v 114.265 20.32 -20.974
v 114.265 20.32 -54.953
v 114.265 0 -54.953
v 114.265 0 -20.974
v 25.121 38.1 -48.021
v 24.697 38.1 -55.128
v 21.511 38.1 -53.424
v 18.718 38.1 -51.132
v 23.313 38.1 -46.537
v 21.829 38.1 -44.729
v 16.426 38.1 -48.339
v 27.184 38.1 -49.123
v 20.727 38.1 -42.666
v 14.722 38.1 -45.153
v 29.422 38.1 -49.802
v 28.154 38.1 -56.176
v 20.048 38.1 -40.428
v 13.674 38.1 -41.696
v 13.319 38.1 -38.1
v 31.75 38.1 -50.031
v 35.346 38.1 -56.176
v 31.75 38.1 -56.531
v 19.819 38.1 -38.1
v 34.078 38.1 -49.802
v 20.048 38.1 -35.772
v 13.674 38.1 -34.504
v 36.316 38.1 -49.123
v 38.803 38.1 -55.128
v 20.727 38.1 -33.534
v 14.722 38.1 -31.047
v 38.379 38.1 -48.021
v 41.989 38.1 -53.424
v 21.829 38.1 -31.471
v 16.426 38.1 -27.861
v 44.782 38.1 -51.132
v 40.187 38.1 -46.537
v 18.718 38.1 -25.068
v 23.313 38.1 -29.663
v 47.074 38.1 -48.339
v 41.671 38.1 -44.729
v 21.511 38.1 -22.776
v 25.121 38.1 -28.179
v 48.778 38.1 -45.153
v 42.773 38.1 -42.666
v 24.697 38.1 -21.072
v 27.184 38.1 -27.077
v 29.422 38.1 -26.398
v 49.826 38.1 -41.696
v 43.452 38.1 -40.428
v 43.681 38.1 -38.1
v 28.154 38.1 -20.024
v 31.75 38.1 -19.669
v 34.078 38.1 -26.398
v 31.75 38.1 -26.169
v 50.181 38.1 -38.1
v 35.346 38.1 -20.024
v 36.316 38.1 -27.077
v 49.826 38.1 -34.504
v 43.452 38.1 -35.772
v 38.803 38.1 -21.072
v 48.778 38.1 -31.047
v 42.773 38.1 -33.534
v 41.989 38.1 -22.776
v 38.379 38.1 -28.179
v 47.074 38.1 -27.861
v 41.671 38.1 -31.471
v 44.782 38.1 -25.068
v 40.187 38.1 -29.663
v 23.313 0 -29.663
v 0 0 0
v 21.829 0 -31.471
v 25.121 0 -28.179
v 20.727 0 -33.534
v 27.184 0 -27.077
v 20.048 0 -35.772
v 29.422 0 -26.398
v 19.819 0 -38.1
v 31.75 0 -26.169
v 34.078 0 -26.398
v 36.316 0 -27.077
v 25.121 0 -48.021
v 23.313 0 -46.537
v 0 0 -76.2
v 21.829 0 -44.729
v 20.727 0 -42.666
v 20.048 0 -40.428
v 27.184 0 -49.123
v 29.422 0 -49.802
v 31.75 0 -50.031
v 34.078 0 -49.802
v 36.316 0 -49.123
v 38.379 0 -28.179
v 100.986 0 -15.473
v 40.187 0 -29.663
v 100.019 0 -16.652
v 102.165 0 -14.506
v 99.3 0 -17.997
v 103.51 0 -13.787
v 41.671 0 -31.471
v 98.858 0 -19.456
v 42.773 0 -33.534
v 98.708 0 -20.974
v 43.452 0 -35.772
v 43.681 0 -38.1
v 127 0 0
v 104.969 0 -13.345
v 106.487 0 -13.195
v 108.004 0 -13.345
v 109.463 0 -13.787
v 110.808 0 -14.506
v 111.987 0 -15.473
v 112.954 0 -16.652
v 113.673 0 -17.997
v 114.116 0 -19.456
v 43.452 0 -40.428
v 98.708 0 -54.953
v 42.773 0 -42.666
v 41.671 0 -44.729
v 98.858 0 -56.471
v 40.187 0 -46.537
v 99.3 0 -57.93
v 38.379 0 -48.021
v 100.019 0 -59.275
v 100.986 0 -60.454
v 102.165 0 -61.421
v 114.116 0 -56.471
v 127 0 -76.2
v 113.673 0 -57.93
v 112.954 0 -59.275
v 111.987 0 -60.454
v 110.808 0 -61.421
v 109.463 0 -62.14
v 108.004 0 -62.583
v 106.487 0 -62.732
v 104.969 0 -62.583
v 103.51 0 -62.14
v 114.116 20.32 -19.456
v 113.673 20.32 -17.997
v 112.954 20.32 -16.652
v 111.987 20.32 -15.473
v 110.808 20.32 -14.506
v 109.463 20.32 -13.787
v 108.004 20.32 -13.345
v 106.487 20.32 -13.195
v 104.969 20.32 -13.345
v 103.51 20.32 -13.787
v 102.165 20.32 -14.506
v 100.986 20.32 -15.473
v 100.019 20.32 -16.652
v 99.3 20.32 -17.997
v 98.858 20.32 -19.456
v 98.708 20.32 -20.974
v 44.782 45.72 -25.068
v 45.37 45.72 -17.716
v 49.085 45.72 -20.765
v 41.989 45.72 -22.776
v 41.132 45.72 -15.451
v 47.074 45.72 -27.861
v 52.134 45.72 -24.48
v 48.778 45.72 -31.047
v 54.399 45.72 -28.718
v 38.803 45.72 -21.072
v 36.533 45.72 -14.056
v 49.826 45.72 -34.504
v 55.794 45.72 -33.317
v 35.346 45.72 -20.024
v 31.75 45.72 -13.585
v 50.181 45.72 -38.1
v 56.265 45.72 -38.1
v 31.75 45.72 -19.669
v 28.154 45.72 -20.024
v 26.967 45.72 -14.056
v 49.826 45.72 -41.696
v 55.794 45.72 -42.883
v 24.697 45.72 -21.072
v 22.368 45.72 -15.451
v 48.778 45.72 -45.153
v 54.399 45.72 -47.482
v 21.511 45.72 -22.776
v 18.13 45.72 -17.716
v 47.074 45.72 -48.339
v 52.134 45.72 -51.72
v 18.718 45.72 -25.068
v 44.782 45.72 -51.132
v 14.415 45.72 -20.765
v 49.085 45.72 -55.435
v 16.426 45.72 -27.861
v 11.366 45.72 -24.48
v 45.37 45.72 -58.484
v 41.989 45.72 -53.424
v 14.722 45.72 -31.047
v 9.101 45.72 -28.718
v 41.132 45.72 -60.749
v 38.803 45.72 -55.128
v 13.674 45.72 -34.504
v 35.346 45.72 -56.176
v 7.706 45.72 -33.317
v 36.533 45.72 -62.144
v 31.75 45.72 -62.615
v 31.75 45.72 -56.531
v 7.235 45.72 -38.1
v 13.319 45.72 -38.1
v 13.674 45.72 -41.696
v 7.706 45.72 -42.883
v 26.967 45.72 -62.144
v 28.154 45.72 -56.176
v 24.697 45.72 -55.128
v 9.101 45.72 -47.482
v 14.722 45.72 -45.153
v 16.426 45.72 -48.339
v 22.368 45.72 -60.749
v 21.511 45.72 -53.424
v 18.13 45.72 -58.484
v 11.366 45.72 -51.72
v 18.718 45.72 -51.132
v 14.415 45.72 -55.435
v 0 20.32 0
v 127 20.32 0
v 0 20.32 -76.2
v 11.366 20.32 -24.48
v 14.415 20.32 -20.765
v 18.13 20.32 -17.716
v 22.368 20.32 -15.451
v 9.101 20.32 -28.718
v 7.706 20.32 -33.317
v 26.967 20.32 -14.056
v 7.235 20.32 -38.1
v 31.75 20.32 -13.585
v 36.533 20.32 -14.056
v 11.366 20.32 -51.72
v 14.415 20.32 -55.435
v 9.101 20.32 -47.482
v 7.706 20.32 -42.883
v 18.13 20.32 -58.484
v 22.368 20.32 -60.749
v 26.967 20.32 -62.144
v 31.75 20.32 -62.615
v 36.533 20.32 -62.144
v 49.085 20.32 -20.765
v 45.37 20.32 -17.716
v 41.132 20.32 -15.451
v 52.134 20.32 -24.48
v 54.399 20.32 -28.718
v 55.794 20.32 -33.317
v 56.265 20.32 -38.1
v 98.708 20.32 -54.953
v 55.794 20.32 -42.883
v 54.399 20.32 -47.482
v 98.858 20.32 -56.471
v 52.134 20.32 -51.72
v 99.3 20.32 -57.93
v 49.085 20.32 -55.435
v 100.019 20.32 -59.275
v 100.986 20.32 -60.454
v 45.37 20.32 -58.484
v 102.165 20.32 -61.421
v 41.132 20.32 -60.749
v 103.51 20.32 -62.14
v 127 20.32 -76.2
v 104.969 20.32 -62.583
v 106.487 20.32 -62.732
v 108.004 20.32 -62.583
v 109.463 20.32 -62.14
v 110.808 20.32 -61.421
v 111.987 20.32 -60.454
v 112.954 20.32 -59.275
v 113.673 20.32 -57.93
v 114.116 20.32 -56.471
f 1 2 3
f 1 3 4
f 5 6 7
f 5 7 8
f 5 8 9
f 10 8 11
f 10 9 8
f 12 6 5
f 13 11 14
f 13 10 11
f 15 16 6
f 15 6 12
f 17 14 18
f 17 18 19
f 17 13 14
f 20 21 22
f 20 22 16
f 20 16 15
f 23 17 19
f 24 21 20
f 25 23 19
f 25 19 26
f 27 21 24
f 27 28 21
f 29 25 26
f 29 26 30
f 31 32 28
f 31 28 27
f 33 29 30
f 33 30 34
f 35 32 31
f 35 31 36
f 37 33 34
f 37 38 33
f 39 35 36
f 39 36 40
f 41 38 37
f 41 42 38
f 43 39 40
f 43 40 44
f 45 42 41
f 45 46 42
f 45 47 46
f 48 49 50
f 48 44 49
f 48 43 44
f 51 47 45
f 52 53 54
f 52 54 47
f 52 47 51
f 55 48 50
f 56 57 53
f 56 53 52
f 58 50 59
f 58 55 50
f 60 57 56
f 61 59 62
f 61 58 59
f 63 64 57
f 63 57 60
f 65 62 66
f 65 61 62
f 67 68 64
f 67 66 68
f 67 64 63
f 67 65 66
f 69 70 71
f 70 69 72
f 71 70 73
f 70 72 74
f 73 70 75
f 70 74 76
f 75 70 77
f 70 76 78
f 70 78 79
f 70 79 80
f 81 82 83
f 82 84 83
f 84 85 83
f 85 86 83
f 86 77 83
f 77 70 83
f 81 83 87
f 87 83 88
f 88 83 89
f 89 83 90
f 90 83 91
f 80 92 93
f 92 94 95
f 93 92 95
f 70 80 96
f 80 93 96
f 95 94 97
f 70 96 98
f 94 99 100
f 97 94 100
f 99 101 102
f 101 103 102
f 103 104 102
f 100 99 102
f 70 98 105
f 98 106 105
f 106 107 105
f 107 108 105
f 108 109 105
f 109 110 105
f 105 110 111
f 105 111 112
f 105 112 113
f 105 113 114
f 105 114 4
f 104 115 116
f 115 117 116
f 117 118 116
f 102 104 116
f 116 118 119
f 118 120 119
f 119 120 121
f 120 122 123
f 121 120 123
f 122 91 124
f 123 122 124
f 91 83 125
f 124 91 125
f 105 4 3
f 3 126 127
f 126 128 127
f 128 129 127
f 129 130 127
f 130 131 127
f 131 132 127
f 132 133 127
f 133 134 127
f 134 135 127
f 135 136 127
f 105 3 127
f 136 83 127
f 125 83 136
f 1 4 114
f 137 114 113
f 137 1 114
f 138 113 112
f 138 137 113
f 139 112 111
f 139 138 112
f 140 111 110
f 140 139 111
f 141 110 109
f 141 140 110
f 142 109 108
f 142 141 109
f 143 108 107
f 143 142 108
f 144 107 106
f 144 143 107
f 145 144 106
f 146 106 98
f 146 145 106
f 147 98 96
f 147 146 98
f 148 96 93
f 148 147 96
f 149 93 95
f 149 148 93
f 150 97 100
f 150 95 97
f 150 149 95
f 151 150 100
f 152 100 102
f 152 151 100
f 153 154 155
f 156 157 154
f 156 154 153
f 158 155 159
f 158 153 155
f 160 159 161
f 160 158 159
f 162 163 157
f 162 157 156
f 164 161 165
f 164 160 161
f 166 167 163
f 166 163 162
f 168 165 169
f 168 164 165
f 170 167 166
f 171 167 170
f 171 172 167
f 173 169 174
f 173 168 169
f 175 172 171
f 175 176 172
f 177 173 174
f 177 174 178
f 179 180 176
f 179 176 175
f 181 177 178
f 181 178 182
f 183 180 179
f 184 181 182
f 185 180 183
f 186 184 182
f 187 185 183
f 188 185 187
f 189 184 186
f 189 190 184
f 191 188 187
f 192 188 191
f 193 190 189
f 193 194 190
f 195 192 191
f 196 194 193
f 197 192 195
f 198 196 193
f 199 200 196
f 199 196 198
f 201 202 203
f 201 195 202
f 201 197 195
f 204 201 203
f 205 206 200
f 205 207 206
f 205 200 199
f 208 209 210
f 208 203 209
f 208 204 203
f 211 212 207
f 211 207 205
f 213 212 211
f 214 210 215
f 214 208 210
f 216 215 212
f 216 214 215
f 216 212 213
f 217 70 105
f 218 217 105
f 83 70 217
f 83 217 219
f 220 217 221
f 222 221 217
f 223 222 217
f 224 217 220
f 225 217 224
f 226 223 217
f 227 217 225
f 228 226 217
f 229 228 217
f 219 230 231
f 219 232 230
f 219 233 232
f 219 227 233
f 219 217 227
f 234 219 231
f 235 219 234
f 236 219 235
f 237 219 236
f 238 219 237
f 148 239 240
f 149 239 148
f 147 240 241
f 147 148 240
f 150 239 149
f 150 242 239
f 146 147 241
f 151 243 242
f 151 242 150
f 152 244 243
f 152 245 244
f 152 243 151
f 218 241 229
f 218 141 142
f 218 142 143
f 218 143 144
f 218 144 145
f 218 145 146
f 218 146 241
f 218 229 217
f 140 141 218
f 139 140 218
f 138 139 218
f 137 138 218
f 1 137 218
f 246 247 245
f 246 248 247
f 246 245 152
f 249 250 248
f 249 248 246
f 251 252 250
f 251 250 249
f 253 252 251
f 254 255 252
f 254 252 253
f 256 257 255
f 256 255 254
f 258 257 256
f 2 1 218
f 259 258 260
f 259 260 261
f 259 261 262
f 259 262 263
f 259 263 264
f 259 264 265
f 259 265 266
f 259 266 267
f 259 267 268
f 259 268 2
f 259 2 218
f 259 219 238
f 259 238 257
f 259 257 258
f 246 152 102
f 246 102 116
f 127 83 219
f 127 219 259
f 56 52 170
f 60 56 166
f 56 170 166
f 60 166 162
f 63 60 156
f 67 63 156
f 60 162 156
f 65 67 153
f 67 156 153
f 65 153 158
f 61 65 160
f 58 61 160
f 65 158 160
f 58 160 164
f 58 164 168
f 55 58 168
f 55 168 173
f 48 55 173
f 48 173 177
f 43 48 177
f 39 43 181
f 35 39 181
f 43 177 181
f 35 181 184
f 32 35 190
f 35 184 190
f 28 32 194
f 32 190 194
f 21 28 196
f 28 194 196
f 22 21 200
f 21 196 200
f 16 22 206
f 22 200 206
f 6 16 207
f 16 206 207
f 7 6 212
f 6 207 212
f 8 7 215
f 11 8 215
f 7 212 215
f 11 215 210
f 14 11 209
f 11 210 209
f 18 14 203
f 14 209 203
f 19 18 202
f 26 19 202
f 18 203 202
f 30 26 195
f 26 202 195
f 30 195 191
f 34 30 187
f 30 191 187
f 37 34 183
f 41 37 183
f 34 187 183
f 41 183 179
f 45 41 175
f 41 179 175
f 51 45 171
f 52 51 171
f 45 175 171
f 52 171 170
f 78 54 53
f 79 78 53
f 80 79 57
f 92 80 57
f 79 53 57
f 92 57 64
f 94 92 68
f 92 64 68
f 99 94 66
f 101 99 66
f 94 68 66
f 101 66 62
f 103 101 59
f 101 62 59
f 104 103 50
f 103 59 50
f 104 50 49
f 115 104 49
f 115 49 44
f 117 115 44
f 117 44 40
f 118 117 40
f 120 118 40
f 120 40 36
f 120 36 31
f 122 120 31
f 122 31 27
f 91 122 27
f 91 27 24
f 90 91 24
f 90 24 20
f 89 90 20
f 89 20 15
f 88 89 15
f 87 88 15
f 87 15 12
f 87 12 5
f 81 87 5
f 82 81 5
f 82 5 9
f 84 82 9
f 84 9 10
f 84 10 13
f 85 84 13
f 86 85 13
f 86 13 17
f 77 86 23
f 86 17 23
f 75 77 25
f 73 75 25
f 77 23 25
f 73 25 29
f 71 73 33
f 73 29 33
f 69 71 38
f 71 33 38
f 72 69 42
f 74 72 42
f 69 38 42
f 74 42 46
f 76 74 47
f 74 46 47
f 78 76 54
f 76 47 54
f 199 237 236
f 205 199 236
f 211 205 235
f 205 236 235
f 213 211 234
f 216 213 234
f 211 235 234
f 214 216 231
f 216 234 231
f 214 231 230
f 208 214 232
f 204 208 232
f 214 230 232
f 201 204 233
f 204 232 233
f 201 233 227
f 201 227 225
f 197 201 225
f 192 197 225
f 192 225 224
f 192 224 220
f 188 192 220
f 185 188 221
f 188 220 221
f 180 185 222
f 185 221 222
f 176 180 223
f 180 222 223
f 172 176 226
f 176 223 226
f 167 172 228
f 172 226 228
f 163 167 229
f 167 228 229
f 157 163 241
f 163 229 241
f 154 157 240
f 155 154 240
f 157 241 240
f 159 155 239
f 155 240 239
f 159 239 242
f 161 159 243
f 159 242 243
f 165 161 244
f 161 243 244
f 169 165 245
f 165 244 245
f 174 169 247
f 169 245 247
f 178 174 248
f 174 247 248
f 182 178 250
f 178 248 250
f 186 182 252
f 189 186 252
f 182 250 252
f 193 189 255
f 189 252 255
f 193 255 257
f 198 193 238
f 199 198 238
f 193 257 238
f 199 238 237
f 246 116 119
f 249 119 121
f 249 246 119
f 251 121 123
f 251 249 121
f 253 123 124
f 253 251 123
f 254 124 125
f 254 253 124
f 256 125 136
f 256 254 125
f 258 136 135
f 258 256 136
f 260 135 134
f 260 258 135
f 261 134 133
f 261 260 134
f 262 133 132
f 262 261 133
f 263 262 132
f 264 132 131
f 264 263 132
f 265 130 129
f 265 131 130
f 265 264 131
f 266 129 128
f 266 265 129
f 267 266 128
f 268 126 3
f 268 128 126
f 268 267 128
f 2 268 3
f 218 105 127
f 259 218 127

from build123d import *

# Parameters (mm, degrees)
SKETCH1_W           = 127
SKETCH1_H           = 76.2
BOSS_EXTRUDE1_DEPTH = 20.32
CUT_EXTRUDE2_DEPTH  = 150.493619931
SKETCH4_R           = 24.515114189
BOSS_EXTRUDE2_DEPTH = 25.4
SKETCH5_R           = 11.931407315
CUT_EXTRUDE3_DEPTH  = 156.002446432
SKETCH6_R           = 18.430592643
CUT_EXTRUDE4_DEPTH  = 7.62


with BuildPart() as part:
    # Sketch1 → Boss-Extrude1 (new body)
    with BuildSketch(Plane(origin=(0, 0, 0), x_dir=(1, 0, 0), z_dir=(0, 1, 0))):
        with Locations((63.5, 38.1)):
            Rectangle(SKETCH1_W, SKETCH1_H)
    extrude(amount=BOSS_EXTRUDE1_DEPTH)

    # Sketch2 → Cut-Extrude2 (cut, through all)
    with BuildSketch(Plane(origin=(0, 20.32, 0), x_dir=(1, 0, 0), z_dir=(0, 1, 0))):
        with BuildLine():
            Line((98.708096341, 20.973581043), (98.708096341, 54.953487977))
            ThreePointArc((98.708096341, 54.953487977), (106.486629254, 62.73202089), (114.265162167, 54.953487977))
            Line((114.265162167, 54.953487977), (114.265162167, 20.973581043))
            ThreePointArc((114.265162167, 20.973581043), (106.486629254, 13.195048131), (98.708096341, 20.973581043))
        make_face()
    extrude(amount=-CUT_EXTRUDE2_DEPTH, mode=Mode.SUBTRACT)

    # Sketch4 → Boss-Extrude2 (add)
    with BuildSketch(Plane(origin=(0, 20.32, 0), x_dir=(1, 0, 0), z_dir=(0, 1, 0))):
        with Locations(Location((31.75, 38.1, 0), (0, 0, 90))):
            Circle(SKETCH4_R)
    extrude(amount=BOSS_EXTRUDE2_DEPTH)

    # Sketch5 → Cut-Extrude3 (cut, through all)
    with BuildSketch(Plane(origin=(0, 45.72, 0), x_dir=(1, 0, 0), z_dir=(0, 1, 0))):
        with Locations(Location((31.75, 38.1, 0), (0, 0, 270))):
            Circle(SKETCH5_R)
    extrude(amount=-CUT_EXTRUDE3_DEPTH, mode=Mode.SUBTRACT)

    # Sketch6 → Cut-Extrude4 (cut)
    with BuildSketch(Plane(origin=(0, 45.72, 0), x_dir=(1, 0, 0), z_dir=(0, 1, 0))):
        with Locations(Location((31.75, 38.1, 0), (0, 0, 270))):
            Circle(SKETCH6_R)
    extrude(amount=-CUT_EXTRUDE4_DEPTH, mode=Mode.SUBTRACT)


solid = part.part
